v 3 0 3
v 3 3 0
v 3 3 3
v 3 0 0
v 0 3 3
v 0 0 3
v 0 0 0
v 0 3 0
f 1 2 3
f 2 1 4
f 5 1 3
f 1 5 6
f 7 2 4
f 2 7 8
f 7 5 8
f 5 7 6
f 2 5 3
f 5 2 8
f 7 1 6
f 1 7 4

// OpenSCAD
/* [Hidden] */

// onescad: defs.scad

sz = 3;

part();

module part() { cube(sz); }

part();

// onescad: main.scad

cube(sz);
